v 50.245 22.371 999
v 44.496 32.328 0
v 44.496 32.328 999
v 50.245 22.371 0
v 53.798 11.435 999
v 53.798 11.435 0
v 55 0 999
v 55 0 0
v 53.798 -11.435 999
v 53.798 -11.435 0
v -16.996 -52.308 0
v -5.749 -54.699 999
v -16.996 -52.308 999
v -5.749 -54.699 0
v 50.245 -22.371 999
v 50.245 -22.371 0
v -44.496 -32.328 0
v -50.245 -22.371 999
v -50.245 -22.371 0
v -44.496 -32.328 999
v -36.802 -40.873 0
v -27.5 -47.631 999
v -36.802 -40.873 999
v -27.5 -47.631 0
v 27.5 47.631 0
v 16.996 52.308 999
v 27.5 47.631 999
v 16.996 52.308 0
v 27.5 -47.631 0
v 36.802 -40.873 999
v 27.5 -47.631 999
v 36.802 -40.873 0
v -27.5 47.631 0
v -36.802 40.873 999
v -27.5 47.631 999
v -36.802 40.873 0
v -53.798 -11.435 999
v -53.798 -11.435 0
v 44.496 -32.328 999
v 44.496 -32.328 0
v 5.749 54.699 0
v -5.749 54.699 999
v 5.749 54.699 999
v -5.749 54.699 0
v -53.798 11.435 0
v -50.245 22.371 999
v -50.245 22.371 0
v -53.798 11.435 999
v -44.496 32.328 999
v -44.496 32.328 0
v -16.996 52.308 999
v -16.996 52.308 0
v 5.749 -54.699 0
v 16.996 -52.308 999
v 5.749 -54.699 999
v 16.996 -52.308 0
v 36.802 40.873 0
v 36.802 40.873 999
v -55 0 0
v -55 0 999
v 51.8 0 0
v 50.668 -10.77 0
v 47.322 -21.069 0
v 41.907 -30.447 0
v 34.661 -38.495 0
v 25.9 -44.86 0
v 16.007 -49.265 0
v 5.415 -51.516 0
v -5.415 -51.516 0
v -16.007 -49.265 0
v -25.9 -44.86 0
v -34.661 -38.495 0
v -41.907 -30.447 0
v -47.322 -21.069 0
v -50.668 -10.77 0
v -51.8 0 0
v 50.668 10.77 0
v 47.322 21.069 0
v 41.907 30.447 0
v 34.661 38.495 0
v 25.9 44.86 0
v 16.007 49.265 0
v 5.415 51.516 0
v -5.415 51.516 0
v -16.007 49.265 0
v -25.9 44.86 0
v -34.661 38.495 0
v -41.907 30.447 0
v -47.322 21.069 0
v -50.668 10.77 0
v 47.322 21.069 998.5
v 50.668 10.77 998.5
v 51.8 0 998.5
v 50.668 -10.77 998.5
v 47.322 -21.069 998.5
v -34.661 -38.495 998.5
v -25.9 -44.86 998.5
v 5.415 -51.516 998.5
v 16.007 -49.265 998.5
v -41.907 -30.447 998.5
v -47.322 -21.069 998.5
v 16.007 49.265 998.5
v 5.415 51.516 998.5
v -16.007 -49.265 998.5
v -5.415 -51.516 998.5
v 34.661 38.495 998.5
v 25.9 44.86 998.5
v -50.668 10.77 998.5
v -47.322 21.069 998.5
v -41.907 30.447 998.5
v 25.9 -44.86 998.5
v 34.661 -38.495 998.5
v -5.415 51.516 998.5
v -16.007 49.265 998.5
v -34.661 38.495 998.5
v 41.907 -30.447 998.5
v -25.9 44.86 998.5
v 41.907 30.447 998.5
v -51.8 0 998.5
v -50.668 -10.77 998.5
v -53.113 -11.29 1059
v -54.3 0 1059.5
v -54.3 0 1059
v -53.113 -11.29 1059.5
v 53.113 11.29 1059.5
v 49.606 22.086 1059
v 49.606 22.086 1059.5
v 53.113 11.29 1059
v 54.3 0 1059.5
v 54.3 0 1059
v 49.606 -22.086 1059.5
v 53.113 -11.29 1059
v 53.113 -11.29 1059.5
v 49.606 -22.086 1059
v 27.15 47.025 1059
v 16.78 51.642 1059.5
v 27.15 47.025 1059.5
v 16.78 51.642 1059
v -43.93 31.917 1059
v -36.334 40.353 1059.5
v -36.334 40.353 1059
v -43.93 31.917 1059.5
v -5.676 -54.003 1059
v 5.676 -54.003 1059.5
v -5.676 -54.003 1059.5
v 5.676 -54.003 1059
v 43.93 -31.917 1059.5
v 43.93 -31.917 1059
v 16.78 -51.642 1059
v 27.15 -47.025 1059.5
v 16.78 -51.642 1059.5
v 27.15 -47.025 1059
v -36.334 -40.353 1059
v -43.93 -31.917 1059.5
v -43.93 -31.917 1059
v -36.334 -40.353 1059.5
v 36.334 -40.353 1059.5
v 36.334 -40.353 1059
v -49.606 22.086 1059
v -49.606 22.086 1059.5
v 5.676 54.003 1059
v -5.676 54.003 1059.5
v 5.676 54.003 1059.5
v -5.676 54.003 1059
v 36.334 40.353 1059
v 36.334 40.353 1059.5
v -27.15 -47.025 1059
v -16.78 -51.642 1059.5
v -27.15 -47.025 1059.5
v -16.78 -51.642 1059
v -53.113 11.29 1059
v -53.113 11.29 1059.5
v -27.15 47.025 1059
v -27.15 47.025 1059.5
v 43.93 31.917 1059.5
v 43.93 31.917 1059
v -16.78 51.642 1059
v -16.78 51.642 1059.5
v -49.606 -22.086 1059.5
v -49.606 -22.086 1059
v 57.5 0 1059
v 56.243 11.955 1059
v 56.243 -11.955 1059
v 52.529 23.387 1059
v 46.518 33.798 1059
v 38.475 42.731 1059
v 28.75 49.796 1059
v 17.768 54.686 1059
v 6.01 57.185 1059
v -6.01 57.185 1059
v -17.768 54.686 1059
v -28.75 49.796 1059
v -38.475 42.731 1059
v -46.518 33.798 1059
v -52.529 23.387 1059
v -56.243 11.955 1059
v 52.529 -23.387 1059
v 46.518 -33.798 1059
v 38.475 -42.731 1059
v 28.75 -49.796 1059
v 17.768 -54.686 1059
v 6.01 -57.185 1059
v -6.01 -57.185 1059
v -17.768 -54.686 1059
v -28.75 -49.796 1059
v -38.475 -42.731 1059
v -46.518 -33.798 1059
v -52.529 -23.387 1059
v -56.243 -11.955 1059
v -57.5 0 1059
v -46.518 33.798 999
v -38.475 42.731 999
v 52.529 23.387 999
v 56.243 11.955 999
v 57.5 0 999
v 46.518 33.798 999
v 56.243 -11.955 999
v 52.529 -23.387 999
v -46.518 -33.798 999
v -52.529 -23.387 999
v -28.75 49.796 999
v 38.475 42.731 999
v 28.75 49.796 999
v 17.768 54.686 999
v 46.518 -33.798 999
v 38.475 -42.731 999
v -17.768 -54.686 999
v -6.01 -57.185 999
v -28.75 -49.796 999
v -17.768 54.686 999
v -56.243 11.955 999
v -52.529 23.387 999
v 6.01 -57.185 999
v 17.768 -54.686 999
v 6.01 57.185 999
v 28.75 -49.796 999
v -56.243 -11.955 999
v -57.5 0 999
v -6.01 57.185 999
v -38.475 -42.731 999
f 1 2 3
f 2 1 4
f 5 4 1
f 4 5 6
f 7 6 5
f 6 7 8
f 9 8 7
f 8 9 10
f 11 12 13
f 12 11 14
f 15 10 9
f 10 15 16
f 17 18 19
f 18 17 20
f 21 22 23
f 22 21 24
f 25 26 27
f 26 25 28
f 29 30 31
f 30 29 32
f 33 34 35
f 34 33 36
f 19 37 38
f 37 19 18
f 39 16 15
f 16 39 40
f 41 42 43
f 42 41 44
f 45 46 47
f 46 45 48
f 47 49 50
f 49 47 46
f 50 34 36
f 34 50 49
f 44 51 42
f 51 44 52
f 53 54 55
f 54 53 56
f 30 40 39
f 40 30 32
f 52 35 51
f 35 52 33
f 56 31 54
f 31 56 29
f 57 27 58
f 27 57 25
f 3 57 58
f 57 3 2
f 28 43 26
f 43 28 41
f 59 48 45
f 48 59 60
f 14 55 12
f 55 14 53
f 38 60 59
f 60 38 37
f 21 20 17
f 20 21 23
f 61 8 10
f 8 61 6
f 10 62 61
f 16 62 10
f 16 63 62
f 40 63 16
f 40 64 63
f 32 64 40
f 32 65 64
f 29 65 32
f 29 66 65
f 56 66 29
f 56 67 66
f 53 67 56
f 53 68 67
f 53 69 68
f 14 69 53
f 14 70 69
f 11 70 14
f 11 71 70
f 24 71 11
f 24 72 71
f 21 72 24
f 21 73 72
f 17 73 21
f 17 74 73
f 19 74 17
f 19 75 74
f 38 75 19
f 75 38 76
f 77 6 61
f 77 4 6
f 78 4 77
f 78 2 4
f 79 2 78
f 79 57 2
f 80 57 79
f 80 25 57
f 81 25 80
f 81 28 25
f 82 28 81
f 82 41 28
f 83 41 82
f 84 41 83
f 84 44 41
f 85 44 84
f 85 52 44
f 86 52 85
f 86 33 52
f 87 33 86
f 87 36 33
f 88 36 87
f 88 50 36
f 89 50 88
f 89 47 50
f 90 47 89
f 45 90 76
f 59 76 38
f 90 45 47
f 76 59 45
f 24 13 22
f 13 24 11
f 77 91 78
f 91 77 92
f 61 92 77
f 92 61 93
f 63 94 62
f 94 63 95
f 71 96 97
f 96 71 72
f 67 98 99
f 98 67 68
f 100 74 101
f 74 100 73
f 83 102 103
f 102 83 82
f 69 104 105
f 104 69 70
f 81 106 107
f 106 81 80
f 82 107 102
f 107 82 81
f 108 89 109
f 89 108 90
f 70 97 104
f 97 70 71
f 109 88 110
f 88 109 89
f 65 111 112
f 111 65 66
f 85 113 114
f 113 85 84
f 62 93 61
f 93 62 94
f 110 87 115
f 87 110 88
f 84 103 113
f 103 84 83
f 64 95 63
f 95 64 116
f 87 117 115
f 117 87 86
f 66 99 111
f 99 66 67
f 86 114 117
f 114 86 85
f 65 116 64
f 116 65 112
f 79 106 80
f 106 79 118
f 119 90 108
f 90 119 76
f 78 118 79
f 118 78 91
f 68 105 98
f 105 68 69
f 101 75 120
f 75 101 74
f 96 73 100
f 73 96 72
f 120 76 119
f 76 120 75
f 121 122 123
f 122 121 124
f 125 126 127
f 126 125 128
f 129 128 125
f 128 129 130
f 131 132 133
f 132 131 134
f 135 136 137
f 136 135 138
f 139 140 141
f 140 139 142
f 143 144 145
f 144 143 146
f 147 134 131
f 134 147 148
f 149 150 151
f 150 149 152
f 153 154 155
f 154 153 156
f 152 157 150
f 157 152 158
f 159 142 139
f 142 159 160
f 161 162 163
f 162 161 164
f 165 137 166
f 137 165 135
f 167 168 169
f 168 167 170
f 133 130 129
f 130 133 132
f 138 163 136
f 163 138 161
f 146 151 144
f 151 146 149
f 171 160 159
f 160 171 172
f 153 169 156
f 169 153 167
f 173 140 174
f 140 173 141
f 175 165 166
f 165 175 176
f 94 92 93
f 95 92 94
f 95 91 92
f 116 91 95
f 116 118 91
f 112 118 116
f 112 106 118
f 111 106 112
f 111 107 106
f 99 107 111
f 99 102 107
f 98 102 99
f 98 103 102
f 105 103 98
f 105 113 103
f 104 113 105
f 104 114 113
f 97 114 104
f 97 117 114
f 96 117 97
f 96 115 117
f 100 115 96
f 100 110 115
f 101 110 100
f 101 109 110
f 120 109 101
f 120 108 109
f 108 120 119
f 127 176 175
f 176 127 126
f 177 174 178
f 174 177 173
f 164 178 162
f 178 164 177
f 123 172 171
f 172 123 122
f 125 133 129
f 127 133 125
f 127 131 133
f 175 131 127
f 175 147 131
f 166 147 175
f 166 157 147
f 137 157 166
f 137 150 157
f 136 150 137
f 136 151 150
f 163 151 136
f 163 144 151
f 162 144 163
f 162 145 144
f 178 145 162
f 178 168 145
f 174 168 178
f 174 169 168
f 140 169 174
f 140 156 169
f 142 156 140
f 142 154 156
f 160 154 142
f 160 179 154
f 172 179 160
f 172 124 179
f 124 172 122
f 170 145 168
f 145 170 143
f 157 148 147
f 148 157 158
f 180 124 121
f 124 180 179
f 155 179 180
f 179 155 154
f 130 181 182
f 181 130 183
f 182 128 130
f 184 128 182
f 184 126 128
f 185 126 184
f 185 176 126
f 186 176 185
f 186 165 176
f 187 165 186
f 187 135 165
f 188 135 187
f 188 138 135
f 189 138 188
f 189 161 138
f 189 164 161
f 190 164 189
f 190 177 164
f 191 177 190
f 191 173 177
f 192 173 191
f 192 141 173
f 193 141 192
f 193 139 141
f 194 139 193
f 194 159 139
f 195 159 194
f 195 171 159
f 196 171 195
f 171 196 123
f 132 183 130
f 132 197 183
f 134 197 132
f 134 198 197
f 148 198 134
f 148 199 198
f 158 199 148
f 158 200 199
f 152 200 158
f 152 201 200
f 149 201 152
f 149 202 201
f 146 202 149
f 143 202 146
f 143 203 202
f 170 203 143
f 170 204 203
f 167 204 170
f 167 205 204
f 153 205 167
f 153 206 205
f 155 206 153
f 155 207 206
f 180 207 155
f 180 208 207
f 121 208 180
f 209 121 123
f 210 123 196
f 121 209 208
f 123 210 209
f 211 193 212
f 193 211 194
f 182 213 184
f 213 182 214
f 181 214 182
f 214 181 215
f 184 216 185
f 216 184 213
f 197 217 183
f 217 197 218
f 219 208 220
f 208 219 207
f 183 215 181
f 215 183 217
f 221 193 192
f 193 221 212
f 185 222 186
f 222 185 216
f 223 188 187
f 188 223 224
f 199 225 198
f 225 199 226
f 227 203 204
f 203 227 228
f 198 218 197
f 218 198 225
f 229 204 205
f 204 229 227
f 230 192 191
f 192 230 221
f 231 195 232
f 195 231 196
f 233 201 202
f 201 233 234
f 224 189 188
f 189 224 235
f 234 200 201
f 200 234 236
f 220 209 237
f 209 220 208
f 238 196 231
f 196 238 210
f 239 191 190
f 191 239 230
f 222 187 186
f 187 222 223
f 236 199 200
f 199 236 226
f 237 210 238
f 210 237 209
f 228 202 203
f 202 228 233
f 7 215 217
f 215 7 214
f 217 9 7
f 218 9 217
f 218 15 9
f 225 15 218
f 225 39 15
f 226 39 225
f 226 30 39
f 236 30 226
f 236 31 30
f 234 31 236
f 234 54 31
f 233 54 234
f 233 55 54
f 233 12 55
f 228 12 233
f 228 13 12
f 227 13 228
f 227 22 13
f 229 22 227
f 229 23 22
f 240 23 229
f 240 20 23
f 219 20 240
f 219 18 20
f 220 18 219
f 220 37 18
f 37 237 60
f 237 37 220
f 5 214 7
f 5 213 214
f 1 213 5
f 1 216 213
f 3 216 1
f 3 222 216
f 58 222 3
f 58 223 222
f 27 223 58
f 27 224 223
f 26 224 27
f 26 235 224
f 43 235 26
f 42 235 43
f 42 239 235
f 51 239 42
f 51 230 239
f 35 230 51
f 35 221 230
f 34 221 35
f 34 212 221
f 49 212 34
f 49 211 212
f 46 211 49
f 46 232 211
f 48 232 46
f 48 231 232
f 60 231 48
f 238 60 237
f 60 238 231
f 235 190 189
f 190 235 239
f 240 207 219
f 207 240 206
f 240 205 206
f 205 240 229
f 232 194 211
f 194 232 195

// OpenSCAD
// Parameters
nominal_diameter_mm = 110; //[55:220:1]
length_mm = 1000; //[500:2000:10]
center = 0; //[0:1:1]
ht110_outer_diameter_mm = 110; //[55:220:1]
ht110_wall_thickness_mm = 3.2; //[1.6:6.4:0.1]
fit_socket_length_mm = 60; //[30:120:1]
fit_socket_wall_extra_mm = 2.5; //[1:6:0.1]
fit_stop_ring_thickness_mm = 4; //[2:10:0.5]
fit_stop_ring_radial_mm = 2; //[1:6:0.5]
overlap_mm = 1; //[0.5:2:0.1]

// HT Pipe - complete geometry
module ht_pipe() {
  color([0.85, 0.85, 0.8]) { // PVC color
    difference() {
      // Outer pipe
      cylinder(h=length_mm, r=ht110_outer_diameter_mm/2, center=false);
      
      // Inner void
      translate([0, 0, -overlap_mm/2])
        cylinder(h=length_mm + overlap_mm, r=ht110_outer_diameter_mm/2 - ht110_wall_thickness_mm, center=false);
    }
    
    // End fitting socket
    union() {
      // Outer socket
      translate([0, 0, length_mm - overlap_mm])
        cylinder(h=fit_socket_length_mm, r=ht110_outer_diameter_mm/2 + fit_socket_wall_extra_mm, center=false);
      
      // Inner void of socket
      translate([0, 0, length_mm - overlap_mm - overlap_mm/2])
        difference() {
          cylinder(h=fit_socket_length_mm + overlap_mm, r=ht110_outer_diameter_mm/2 - ht110_wall_thickness_mm + fit_socket_wall_extra_mm, center=false);
          
          // Stop ring void
          translate([0, 0, fit_socket_length_mm - fit_stop_ring_thickness_mm - overlap_mm/2])
            cylinder(h=fit_stop_ring_thickness_mm + overlap_mm, r=ht110_outer_diameter_mm/2 - ht110_wall_thickness_mm + fit_socket_wall_extra_mm - fit_stop_ring_radial_mm, center=false);
        }
    }
  }
}

// Assembly
module assembly() {
  ht_pipe();
}

assembly();
